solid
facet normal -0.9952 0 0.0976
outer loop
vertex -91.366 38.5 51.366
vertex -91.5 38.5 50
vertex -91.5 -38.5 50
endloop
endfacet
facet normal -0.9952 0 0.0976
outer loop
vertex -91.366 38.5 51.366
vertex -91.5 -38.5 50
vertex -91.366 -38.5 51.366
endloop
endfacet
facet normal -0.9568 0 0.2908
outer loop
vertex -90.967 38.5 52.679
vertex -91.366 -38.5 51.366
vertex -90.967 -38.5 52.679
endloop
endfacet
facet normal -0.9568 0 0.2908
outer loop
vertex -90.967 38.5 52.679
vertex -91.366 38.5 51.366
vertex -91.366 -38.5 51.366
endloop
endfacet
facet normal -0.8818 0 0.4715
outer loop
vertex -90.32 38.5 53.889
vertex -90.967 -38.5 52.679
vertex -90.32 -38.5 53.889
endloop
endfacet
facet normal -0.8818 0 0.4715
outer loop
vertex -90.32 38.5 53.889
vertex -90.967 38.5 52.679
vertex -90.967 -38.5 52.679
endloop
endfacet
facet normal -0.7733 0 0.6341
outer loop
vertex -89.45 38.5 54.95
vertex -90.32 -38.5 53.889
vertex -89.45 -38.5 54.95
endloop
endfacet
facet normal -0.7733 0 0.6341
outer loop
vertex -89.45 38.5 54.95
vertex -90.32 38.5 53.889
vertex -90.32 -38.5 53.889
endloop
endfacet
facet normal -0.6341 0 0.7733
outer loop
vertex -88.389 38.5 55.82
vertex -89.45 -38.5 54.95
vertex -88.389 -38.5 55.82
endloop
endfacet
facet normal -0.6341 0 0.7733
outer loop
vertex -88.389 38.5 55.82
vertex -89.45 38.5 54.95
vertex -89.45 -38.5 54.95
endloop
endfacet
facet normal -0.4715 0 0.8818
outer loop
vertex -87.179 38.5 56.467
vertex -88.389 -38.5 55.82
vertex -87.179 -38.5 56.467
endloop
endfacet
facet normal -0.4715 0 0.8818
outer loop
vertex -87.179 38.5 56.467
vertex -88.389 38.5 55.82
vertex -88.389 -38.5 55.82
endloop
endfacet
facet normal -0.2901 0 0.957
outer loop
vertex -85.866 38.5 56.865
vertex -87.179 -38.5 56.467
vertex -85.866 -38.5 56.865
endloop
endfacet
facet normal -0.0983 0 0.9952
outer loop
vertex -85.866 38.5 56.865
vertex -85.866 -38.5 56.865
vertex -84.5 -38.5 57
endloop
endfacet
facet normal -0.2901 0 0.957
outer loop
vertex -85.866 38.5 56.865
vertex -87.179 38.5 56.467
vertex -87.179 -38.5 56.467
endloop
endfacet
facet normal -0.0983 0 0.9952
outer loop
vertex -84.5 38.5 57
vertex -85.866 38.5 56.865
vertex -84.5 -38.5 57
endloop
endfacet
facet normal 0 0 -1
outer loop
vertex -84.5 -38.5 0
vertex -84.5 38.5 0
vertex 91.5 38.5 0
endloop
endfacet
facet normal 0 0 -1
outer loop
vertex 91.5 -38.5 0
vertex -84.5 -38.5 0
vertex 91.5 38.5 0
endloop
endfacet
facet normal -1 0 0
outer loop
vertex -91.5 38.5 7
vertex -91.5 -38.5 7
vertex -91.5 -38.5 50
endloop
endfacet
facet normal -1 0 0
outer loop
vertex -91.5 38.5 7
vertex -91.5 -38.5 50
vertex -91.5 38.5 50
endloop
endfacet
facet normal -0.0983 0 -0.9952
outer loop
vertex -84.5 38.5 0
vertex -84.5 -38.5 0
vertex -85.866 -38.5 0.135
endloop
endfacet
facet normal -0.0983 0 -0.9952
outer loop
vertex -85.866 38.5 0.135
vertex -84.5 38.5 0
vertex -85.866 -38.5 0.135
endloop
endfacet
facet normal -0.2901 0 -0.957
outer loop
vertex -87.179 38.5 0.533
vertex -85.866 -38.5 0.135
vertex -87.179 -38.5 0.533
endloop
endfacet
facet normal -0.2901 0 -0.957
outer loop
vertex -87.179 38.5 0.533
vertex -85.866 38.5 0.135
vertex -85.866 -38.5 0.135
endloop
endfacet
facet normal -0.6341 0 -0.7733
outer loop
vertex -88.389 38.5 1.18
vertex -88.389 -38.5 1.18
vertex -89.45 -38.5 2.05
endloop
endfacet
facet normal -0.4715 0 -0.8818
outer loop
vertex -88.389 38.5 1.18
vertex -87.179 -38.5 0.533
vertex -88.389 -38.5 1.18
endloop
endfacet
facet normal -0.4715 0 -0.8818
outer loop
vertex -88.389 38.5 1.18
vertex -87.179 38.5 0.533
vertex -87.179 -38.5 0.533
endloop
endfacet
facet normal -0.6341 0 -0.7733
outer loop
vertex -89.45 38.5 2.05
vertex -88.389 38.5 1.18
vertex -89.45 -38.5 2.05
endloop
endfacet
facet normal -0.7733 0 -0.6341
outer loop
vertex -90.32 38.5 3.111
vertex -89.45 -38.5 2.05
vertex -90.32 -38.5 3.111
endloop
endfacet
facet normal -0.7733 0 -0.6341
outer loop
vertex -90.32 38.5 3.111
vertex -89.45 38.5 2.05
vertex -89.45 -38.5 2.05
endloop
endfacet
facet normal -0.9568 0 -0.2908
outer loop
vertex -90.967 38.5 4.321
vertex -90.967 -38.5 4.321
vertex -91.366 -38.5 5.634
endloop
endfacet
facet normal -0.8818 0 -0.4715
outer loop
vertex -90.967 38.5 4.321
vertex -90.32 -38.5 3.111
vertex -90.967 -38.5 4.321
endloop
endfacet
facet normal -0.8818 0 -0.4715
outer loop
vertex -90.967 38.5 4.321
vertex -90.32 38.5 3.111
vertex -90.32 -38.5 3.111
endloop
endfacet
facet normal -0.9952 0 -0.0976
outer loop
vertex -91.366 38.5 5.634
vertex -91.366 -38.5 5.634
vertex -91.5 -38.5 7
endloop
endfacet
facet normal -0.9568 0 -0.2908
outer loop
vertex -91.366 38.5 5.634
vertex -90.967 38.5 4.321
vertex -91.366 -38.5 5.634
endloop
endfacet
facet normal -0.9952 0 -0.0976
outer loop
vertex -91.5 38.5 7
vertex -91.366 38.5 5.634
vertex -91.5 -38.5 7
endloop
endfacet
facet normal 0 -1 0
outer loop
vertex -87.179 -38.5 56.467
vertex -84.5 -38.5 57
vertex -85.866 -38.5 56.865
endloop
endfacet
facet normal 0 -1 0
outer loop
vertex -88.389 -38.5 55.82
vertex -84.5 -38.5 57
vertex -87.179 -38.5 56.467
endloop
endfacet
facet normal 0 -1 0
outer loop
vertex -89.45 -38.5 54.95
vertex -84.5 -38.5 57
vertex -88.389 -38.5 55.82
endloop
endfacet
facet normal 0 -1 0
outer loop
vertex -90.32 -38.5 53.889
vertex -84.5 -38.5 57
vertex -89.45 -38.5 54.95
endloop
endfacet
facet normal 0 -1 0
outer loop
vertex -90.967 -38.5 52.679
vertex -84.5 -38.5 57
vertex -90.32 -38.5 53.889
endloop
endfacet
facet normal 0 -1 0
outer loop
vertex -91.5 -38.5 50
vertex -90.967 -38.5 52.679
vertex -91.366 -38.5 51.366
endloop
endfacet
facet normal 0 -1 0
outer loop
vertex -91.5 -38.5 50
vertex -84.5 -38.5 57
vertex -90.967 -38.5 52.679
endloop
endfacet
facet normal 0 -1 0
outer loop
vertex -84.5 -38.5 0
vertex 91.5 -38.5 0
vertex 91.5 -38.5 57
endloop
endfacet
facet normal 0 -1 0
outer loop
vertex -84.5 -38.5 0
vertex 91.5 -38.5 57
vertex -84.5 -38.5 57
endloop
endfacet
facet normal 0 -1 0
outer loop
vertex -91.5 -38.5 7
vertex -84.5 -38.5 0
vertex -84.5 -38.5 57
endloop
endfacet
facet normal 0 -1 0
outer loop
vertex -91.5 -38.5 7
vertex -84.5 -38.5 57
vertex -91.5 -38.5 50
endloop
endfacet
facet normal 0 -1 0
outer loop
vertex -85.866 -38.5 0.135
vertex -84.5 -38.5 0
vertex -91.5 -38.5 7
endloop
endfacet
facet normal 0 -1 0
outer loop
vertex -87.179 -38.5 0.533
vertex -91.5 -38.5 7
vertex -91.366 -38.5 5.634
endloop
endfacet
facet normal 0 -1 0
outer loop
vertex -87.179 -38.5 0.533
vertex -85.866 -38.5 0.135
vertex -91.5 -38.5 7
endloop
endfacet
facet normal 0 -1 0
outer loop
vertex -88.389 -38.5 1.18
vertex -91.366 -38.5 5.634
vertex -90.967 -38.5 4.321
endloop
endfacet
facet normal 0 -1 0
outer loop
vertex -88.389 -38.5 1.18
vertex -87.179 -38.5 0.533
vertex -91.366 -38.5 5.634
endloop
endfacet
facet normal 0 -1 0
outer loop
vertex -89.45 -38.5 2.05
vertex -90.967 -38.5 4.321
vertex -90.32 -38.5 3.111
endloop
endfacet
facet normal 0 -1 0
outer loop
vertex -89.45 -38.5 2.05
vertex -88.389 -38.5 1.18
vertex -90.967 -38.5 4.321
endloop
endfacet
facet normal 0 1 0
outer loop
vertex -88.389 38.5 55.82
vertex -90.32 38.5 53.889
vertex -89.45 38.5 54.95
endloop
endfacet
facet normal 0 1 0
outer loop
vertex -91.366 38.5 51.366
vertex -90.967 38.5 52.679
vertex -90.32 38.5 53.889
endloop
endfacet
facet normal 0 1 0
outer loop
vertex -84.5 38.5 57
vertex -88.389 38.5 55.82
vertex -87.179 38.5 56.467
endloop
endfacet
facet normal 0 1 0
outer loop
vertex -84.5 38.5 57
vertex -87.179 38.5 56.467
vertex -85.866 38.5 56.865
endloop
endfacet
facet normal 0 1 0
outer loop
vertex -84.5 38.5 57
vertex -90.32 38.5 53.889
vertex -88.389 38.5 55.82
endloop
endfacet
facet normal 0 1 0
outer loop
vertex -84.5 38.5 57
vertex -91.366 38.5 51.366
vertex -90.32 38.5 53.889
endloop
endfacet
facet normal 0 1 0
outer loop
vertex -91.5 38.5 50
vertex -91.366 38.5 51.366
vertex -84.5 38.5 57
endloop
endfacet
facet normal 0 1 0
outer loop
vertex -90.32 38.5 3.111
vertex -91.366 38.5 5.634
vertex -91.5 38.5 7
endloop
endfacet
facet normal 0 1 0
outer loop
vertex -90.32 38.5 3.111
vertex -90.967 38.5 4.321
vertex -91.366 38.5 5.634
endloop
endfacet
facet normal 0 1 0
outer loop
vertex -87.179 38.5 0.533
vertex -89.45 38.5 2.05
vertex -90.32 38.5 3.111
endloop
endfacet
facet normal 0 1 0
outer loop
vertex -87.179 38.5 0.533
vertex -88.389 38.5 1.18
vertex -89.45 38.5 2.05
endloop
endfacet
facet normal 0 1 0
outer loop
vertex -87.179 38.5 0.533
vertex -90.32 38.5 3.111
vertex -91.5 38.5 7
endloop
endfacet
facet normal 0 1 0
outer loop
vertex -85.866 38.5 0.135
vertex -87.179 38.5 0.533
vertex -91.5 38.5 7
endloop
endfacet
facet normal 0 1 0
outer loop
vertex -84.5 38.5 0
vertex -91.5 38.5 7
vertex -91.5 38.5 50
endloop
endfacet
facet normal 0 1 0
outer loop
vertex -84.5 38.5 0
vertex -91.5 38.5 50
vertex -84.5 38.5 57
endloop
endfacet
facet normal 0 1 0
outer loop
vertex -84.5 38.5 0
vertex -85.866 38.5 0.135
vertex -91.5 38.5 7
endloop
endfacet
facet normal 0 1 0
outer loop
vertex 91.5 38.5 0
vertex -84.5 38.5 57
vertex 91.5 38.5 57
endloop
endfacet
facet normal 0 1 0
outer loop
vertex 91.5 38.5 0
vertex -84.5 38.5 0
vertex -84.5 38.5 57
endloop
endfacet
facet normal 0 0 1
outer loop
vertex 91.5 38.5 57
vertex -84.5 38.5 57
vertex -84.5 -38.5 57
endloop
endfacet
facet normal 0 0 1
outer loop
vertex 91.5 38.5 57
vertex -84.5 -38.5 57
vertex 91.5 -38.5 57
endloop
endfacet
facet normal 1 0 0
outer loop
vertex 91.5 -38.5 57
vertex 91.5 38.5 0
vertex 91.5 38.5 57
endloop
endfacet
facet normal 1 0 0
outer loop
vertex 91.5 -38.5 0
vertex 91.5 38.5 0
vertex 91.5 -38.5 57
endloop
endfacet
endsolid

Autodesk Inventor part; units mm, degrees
ref_plane "YZ Plane" through (0, 0, 0) normal (1, 0, 0) x (0, 1, 0)
ref_plane "XZ Plane" through (0, 0, 0) normal (0, 1, 0) x (-1, 0, 0)
ref_plane "XY Plane" through (0, 0, 0) normal (0, 0, 1) x (1, 0, 0)
sketch "Sketch1" plane through (0, 0, 0) normal (0, 0, 1) x (1, 0, 0)
  point P0 (0, 0)
sketch "Sketch2" plane through (0, 0, 0) normal (0, 0, 1) x (1, 0, 0)
  line L0 (-91.5002, 38.5) -> (91.5002, 38.5)
  line L1 (91.5002, 38.5) -> (91.5002, -38.5)
  line L2 (91.5002, -38.5) -> (-91.5002, -38.5)
  line L3 (-91.5002, -38.5) -> (-91.5002, 38.5)
  line L4 (-91.5002, 38.5) -> (91.5002, -38.5) construction
  line L5 (91.5002, 38.5) -> (-91.5002, -38.5) construction
  point P0 (0, 0)
extrude "Extrusion1" add sketch "Sketch2" along normal blind 57
fillet "Fillet1" radius 7 2 edges at (-91.5002, 0, 57) (-91.5002, 0, 0)
properties part number "turnigy_graphene_12Ah"
